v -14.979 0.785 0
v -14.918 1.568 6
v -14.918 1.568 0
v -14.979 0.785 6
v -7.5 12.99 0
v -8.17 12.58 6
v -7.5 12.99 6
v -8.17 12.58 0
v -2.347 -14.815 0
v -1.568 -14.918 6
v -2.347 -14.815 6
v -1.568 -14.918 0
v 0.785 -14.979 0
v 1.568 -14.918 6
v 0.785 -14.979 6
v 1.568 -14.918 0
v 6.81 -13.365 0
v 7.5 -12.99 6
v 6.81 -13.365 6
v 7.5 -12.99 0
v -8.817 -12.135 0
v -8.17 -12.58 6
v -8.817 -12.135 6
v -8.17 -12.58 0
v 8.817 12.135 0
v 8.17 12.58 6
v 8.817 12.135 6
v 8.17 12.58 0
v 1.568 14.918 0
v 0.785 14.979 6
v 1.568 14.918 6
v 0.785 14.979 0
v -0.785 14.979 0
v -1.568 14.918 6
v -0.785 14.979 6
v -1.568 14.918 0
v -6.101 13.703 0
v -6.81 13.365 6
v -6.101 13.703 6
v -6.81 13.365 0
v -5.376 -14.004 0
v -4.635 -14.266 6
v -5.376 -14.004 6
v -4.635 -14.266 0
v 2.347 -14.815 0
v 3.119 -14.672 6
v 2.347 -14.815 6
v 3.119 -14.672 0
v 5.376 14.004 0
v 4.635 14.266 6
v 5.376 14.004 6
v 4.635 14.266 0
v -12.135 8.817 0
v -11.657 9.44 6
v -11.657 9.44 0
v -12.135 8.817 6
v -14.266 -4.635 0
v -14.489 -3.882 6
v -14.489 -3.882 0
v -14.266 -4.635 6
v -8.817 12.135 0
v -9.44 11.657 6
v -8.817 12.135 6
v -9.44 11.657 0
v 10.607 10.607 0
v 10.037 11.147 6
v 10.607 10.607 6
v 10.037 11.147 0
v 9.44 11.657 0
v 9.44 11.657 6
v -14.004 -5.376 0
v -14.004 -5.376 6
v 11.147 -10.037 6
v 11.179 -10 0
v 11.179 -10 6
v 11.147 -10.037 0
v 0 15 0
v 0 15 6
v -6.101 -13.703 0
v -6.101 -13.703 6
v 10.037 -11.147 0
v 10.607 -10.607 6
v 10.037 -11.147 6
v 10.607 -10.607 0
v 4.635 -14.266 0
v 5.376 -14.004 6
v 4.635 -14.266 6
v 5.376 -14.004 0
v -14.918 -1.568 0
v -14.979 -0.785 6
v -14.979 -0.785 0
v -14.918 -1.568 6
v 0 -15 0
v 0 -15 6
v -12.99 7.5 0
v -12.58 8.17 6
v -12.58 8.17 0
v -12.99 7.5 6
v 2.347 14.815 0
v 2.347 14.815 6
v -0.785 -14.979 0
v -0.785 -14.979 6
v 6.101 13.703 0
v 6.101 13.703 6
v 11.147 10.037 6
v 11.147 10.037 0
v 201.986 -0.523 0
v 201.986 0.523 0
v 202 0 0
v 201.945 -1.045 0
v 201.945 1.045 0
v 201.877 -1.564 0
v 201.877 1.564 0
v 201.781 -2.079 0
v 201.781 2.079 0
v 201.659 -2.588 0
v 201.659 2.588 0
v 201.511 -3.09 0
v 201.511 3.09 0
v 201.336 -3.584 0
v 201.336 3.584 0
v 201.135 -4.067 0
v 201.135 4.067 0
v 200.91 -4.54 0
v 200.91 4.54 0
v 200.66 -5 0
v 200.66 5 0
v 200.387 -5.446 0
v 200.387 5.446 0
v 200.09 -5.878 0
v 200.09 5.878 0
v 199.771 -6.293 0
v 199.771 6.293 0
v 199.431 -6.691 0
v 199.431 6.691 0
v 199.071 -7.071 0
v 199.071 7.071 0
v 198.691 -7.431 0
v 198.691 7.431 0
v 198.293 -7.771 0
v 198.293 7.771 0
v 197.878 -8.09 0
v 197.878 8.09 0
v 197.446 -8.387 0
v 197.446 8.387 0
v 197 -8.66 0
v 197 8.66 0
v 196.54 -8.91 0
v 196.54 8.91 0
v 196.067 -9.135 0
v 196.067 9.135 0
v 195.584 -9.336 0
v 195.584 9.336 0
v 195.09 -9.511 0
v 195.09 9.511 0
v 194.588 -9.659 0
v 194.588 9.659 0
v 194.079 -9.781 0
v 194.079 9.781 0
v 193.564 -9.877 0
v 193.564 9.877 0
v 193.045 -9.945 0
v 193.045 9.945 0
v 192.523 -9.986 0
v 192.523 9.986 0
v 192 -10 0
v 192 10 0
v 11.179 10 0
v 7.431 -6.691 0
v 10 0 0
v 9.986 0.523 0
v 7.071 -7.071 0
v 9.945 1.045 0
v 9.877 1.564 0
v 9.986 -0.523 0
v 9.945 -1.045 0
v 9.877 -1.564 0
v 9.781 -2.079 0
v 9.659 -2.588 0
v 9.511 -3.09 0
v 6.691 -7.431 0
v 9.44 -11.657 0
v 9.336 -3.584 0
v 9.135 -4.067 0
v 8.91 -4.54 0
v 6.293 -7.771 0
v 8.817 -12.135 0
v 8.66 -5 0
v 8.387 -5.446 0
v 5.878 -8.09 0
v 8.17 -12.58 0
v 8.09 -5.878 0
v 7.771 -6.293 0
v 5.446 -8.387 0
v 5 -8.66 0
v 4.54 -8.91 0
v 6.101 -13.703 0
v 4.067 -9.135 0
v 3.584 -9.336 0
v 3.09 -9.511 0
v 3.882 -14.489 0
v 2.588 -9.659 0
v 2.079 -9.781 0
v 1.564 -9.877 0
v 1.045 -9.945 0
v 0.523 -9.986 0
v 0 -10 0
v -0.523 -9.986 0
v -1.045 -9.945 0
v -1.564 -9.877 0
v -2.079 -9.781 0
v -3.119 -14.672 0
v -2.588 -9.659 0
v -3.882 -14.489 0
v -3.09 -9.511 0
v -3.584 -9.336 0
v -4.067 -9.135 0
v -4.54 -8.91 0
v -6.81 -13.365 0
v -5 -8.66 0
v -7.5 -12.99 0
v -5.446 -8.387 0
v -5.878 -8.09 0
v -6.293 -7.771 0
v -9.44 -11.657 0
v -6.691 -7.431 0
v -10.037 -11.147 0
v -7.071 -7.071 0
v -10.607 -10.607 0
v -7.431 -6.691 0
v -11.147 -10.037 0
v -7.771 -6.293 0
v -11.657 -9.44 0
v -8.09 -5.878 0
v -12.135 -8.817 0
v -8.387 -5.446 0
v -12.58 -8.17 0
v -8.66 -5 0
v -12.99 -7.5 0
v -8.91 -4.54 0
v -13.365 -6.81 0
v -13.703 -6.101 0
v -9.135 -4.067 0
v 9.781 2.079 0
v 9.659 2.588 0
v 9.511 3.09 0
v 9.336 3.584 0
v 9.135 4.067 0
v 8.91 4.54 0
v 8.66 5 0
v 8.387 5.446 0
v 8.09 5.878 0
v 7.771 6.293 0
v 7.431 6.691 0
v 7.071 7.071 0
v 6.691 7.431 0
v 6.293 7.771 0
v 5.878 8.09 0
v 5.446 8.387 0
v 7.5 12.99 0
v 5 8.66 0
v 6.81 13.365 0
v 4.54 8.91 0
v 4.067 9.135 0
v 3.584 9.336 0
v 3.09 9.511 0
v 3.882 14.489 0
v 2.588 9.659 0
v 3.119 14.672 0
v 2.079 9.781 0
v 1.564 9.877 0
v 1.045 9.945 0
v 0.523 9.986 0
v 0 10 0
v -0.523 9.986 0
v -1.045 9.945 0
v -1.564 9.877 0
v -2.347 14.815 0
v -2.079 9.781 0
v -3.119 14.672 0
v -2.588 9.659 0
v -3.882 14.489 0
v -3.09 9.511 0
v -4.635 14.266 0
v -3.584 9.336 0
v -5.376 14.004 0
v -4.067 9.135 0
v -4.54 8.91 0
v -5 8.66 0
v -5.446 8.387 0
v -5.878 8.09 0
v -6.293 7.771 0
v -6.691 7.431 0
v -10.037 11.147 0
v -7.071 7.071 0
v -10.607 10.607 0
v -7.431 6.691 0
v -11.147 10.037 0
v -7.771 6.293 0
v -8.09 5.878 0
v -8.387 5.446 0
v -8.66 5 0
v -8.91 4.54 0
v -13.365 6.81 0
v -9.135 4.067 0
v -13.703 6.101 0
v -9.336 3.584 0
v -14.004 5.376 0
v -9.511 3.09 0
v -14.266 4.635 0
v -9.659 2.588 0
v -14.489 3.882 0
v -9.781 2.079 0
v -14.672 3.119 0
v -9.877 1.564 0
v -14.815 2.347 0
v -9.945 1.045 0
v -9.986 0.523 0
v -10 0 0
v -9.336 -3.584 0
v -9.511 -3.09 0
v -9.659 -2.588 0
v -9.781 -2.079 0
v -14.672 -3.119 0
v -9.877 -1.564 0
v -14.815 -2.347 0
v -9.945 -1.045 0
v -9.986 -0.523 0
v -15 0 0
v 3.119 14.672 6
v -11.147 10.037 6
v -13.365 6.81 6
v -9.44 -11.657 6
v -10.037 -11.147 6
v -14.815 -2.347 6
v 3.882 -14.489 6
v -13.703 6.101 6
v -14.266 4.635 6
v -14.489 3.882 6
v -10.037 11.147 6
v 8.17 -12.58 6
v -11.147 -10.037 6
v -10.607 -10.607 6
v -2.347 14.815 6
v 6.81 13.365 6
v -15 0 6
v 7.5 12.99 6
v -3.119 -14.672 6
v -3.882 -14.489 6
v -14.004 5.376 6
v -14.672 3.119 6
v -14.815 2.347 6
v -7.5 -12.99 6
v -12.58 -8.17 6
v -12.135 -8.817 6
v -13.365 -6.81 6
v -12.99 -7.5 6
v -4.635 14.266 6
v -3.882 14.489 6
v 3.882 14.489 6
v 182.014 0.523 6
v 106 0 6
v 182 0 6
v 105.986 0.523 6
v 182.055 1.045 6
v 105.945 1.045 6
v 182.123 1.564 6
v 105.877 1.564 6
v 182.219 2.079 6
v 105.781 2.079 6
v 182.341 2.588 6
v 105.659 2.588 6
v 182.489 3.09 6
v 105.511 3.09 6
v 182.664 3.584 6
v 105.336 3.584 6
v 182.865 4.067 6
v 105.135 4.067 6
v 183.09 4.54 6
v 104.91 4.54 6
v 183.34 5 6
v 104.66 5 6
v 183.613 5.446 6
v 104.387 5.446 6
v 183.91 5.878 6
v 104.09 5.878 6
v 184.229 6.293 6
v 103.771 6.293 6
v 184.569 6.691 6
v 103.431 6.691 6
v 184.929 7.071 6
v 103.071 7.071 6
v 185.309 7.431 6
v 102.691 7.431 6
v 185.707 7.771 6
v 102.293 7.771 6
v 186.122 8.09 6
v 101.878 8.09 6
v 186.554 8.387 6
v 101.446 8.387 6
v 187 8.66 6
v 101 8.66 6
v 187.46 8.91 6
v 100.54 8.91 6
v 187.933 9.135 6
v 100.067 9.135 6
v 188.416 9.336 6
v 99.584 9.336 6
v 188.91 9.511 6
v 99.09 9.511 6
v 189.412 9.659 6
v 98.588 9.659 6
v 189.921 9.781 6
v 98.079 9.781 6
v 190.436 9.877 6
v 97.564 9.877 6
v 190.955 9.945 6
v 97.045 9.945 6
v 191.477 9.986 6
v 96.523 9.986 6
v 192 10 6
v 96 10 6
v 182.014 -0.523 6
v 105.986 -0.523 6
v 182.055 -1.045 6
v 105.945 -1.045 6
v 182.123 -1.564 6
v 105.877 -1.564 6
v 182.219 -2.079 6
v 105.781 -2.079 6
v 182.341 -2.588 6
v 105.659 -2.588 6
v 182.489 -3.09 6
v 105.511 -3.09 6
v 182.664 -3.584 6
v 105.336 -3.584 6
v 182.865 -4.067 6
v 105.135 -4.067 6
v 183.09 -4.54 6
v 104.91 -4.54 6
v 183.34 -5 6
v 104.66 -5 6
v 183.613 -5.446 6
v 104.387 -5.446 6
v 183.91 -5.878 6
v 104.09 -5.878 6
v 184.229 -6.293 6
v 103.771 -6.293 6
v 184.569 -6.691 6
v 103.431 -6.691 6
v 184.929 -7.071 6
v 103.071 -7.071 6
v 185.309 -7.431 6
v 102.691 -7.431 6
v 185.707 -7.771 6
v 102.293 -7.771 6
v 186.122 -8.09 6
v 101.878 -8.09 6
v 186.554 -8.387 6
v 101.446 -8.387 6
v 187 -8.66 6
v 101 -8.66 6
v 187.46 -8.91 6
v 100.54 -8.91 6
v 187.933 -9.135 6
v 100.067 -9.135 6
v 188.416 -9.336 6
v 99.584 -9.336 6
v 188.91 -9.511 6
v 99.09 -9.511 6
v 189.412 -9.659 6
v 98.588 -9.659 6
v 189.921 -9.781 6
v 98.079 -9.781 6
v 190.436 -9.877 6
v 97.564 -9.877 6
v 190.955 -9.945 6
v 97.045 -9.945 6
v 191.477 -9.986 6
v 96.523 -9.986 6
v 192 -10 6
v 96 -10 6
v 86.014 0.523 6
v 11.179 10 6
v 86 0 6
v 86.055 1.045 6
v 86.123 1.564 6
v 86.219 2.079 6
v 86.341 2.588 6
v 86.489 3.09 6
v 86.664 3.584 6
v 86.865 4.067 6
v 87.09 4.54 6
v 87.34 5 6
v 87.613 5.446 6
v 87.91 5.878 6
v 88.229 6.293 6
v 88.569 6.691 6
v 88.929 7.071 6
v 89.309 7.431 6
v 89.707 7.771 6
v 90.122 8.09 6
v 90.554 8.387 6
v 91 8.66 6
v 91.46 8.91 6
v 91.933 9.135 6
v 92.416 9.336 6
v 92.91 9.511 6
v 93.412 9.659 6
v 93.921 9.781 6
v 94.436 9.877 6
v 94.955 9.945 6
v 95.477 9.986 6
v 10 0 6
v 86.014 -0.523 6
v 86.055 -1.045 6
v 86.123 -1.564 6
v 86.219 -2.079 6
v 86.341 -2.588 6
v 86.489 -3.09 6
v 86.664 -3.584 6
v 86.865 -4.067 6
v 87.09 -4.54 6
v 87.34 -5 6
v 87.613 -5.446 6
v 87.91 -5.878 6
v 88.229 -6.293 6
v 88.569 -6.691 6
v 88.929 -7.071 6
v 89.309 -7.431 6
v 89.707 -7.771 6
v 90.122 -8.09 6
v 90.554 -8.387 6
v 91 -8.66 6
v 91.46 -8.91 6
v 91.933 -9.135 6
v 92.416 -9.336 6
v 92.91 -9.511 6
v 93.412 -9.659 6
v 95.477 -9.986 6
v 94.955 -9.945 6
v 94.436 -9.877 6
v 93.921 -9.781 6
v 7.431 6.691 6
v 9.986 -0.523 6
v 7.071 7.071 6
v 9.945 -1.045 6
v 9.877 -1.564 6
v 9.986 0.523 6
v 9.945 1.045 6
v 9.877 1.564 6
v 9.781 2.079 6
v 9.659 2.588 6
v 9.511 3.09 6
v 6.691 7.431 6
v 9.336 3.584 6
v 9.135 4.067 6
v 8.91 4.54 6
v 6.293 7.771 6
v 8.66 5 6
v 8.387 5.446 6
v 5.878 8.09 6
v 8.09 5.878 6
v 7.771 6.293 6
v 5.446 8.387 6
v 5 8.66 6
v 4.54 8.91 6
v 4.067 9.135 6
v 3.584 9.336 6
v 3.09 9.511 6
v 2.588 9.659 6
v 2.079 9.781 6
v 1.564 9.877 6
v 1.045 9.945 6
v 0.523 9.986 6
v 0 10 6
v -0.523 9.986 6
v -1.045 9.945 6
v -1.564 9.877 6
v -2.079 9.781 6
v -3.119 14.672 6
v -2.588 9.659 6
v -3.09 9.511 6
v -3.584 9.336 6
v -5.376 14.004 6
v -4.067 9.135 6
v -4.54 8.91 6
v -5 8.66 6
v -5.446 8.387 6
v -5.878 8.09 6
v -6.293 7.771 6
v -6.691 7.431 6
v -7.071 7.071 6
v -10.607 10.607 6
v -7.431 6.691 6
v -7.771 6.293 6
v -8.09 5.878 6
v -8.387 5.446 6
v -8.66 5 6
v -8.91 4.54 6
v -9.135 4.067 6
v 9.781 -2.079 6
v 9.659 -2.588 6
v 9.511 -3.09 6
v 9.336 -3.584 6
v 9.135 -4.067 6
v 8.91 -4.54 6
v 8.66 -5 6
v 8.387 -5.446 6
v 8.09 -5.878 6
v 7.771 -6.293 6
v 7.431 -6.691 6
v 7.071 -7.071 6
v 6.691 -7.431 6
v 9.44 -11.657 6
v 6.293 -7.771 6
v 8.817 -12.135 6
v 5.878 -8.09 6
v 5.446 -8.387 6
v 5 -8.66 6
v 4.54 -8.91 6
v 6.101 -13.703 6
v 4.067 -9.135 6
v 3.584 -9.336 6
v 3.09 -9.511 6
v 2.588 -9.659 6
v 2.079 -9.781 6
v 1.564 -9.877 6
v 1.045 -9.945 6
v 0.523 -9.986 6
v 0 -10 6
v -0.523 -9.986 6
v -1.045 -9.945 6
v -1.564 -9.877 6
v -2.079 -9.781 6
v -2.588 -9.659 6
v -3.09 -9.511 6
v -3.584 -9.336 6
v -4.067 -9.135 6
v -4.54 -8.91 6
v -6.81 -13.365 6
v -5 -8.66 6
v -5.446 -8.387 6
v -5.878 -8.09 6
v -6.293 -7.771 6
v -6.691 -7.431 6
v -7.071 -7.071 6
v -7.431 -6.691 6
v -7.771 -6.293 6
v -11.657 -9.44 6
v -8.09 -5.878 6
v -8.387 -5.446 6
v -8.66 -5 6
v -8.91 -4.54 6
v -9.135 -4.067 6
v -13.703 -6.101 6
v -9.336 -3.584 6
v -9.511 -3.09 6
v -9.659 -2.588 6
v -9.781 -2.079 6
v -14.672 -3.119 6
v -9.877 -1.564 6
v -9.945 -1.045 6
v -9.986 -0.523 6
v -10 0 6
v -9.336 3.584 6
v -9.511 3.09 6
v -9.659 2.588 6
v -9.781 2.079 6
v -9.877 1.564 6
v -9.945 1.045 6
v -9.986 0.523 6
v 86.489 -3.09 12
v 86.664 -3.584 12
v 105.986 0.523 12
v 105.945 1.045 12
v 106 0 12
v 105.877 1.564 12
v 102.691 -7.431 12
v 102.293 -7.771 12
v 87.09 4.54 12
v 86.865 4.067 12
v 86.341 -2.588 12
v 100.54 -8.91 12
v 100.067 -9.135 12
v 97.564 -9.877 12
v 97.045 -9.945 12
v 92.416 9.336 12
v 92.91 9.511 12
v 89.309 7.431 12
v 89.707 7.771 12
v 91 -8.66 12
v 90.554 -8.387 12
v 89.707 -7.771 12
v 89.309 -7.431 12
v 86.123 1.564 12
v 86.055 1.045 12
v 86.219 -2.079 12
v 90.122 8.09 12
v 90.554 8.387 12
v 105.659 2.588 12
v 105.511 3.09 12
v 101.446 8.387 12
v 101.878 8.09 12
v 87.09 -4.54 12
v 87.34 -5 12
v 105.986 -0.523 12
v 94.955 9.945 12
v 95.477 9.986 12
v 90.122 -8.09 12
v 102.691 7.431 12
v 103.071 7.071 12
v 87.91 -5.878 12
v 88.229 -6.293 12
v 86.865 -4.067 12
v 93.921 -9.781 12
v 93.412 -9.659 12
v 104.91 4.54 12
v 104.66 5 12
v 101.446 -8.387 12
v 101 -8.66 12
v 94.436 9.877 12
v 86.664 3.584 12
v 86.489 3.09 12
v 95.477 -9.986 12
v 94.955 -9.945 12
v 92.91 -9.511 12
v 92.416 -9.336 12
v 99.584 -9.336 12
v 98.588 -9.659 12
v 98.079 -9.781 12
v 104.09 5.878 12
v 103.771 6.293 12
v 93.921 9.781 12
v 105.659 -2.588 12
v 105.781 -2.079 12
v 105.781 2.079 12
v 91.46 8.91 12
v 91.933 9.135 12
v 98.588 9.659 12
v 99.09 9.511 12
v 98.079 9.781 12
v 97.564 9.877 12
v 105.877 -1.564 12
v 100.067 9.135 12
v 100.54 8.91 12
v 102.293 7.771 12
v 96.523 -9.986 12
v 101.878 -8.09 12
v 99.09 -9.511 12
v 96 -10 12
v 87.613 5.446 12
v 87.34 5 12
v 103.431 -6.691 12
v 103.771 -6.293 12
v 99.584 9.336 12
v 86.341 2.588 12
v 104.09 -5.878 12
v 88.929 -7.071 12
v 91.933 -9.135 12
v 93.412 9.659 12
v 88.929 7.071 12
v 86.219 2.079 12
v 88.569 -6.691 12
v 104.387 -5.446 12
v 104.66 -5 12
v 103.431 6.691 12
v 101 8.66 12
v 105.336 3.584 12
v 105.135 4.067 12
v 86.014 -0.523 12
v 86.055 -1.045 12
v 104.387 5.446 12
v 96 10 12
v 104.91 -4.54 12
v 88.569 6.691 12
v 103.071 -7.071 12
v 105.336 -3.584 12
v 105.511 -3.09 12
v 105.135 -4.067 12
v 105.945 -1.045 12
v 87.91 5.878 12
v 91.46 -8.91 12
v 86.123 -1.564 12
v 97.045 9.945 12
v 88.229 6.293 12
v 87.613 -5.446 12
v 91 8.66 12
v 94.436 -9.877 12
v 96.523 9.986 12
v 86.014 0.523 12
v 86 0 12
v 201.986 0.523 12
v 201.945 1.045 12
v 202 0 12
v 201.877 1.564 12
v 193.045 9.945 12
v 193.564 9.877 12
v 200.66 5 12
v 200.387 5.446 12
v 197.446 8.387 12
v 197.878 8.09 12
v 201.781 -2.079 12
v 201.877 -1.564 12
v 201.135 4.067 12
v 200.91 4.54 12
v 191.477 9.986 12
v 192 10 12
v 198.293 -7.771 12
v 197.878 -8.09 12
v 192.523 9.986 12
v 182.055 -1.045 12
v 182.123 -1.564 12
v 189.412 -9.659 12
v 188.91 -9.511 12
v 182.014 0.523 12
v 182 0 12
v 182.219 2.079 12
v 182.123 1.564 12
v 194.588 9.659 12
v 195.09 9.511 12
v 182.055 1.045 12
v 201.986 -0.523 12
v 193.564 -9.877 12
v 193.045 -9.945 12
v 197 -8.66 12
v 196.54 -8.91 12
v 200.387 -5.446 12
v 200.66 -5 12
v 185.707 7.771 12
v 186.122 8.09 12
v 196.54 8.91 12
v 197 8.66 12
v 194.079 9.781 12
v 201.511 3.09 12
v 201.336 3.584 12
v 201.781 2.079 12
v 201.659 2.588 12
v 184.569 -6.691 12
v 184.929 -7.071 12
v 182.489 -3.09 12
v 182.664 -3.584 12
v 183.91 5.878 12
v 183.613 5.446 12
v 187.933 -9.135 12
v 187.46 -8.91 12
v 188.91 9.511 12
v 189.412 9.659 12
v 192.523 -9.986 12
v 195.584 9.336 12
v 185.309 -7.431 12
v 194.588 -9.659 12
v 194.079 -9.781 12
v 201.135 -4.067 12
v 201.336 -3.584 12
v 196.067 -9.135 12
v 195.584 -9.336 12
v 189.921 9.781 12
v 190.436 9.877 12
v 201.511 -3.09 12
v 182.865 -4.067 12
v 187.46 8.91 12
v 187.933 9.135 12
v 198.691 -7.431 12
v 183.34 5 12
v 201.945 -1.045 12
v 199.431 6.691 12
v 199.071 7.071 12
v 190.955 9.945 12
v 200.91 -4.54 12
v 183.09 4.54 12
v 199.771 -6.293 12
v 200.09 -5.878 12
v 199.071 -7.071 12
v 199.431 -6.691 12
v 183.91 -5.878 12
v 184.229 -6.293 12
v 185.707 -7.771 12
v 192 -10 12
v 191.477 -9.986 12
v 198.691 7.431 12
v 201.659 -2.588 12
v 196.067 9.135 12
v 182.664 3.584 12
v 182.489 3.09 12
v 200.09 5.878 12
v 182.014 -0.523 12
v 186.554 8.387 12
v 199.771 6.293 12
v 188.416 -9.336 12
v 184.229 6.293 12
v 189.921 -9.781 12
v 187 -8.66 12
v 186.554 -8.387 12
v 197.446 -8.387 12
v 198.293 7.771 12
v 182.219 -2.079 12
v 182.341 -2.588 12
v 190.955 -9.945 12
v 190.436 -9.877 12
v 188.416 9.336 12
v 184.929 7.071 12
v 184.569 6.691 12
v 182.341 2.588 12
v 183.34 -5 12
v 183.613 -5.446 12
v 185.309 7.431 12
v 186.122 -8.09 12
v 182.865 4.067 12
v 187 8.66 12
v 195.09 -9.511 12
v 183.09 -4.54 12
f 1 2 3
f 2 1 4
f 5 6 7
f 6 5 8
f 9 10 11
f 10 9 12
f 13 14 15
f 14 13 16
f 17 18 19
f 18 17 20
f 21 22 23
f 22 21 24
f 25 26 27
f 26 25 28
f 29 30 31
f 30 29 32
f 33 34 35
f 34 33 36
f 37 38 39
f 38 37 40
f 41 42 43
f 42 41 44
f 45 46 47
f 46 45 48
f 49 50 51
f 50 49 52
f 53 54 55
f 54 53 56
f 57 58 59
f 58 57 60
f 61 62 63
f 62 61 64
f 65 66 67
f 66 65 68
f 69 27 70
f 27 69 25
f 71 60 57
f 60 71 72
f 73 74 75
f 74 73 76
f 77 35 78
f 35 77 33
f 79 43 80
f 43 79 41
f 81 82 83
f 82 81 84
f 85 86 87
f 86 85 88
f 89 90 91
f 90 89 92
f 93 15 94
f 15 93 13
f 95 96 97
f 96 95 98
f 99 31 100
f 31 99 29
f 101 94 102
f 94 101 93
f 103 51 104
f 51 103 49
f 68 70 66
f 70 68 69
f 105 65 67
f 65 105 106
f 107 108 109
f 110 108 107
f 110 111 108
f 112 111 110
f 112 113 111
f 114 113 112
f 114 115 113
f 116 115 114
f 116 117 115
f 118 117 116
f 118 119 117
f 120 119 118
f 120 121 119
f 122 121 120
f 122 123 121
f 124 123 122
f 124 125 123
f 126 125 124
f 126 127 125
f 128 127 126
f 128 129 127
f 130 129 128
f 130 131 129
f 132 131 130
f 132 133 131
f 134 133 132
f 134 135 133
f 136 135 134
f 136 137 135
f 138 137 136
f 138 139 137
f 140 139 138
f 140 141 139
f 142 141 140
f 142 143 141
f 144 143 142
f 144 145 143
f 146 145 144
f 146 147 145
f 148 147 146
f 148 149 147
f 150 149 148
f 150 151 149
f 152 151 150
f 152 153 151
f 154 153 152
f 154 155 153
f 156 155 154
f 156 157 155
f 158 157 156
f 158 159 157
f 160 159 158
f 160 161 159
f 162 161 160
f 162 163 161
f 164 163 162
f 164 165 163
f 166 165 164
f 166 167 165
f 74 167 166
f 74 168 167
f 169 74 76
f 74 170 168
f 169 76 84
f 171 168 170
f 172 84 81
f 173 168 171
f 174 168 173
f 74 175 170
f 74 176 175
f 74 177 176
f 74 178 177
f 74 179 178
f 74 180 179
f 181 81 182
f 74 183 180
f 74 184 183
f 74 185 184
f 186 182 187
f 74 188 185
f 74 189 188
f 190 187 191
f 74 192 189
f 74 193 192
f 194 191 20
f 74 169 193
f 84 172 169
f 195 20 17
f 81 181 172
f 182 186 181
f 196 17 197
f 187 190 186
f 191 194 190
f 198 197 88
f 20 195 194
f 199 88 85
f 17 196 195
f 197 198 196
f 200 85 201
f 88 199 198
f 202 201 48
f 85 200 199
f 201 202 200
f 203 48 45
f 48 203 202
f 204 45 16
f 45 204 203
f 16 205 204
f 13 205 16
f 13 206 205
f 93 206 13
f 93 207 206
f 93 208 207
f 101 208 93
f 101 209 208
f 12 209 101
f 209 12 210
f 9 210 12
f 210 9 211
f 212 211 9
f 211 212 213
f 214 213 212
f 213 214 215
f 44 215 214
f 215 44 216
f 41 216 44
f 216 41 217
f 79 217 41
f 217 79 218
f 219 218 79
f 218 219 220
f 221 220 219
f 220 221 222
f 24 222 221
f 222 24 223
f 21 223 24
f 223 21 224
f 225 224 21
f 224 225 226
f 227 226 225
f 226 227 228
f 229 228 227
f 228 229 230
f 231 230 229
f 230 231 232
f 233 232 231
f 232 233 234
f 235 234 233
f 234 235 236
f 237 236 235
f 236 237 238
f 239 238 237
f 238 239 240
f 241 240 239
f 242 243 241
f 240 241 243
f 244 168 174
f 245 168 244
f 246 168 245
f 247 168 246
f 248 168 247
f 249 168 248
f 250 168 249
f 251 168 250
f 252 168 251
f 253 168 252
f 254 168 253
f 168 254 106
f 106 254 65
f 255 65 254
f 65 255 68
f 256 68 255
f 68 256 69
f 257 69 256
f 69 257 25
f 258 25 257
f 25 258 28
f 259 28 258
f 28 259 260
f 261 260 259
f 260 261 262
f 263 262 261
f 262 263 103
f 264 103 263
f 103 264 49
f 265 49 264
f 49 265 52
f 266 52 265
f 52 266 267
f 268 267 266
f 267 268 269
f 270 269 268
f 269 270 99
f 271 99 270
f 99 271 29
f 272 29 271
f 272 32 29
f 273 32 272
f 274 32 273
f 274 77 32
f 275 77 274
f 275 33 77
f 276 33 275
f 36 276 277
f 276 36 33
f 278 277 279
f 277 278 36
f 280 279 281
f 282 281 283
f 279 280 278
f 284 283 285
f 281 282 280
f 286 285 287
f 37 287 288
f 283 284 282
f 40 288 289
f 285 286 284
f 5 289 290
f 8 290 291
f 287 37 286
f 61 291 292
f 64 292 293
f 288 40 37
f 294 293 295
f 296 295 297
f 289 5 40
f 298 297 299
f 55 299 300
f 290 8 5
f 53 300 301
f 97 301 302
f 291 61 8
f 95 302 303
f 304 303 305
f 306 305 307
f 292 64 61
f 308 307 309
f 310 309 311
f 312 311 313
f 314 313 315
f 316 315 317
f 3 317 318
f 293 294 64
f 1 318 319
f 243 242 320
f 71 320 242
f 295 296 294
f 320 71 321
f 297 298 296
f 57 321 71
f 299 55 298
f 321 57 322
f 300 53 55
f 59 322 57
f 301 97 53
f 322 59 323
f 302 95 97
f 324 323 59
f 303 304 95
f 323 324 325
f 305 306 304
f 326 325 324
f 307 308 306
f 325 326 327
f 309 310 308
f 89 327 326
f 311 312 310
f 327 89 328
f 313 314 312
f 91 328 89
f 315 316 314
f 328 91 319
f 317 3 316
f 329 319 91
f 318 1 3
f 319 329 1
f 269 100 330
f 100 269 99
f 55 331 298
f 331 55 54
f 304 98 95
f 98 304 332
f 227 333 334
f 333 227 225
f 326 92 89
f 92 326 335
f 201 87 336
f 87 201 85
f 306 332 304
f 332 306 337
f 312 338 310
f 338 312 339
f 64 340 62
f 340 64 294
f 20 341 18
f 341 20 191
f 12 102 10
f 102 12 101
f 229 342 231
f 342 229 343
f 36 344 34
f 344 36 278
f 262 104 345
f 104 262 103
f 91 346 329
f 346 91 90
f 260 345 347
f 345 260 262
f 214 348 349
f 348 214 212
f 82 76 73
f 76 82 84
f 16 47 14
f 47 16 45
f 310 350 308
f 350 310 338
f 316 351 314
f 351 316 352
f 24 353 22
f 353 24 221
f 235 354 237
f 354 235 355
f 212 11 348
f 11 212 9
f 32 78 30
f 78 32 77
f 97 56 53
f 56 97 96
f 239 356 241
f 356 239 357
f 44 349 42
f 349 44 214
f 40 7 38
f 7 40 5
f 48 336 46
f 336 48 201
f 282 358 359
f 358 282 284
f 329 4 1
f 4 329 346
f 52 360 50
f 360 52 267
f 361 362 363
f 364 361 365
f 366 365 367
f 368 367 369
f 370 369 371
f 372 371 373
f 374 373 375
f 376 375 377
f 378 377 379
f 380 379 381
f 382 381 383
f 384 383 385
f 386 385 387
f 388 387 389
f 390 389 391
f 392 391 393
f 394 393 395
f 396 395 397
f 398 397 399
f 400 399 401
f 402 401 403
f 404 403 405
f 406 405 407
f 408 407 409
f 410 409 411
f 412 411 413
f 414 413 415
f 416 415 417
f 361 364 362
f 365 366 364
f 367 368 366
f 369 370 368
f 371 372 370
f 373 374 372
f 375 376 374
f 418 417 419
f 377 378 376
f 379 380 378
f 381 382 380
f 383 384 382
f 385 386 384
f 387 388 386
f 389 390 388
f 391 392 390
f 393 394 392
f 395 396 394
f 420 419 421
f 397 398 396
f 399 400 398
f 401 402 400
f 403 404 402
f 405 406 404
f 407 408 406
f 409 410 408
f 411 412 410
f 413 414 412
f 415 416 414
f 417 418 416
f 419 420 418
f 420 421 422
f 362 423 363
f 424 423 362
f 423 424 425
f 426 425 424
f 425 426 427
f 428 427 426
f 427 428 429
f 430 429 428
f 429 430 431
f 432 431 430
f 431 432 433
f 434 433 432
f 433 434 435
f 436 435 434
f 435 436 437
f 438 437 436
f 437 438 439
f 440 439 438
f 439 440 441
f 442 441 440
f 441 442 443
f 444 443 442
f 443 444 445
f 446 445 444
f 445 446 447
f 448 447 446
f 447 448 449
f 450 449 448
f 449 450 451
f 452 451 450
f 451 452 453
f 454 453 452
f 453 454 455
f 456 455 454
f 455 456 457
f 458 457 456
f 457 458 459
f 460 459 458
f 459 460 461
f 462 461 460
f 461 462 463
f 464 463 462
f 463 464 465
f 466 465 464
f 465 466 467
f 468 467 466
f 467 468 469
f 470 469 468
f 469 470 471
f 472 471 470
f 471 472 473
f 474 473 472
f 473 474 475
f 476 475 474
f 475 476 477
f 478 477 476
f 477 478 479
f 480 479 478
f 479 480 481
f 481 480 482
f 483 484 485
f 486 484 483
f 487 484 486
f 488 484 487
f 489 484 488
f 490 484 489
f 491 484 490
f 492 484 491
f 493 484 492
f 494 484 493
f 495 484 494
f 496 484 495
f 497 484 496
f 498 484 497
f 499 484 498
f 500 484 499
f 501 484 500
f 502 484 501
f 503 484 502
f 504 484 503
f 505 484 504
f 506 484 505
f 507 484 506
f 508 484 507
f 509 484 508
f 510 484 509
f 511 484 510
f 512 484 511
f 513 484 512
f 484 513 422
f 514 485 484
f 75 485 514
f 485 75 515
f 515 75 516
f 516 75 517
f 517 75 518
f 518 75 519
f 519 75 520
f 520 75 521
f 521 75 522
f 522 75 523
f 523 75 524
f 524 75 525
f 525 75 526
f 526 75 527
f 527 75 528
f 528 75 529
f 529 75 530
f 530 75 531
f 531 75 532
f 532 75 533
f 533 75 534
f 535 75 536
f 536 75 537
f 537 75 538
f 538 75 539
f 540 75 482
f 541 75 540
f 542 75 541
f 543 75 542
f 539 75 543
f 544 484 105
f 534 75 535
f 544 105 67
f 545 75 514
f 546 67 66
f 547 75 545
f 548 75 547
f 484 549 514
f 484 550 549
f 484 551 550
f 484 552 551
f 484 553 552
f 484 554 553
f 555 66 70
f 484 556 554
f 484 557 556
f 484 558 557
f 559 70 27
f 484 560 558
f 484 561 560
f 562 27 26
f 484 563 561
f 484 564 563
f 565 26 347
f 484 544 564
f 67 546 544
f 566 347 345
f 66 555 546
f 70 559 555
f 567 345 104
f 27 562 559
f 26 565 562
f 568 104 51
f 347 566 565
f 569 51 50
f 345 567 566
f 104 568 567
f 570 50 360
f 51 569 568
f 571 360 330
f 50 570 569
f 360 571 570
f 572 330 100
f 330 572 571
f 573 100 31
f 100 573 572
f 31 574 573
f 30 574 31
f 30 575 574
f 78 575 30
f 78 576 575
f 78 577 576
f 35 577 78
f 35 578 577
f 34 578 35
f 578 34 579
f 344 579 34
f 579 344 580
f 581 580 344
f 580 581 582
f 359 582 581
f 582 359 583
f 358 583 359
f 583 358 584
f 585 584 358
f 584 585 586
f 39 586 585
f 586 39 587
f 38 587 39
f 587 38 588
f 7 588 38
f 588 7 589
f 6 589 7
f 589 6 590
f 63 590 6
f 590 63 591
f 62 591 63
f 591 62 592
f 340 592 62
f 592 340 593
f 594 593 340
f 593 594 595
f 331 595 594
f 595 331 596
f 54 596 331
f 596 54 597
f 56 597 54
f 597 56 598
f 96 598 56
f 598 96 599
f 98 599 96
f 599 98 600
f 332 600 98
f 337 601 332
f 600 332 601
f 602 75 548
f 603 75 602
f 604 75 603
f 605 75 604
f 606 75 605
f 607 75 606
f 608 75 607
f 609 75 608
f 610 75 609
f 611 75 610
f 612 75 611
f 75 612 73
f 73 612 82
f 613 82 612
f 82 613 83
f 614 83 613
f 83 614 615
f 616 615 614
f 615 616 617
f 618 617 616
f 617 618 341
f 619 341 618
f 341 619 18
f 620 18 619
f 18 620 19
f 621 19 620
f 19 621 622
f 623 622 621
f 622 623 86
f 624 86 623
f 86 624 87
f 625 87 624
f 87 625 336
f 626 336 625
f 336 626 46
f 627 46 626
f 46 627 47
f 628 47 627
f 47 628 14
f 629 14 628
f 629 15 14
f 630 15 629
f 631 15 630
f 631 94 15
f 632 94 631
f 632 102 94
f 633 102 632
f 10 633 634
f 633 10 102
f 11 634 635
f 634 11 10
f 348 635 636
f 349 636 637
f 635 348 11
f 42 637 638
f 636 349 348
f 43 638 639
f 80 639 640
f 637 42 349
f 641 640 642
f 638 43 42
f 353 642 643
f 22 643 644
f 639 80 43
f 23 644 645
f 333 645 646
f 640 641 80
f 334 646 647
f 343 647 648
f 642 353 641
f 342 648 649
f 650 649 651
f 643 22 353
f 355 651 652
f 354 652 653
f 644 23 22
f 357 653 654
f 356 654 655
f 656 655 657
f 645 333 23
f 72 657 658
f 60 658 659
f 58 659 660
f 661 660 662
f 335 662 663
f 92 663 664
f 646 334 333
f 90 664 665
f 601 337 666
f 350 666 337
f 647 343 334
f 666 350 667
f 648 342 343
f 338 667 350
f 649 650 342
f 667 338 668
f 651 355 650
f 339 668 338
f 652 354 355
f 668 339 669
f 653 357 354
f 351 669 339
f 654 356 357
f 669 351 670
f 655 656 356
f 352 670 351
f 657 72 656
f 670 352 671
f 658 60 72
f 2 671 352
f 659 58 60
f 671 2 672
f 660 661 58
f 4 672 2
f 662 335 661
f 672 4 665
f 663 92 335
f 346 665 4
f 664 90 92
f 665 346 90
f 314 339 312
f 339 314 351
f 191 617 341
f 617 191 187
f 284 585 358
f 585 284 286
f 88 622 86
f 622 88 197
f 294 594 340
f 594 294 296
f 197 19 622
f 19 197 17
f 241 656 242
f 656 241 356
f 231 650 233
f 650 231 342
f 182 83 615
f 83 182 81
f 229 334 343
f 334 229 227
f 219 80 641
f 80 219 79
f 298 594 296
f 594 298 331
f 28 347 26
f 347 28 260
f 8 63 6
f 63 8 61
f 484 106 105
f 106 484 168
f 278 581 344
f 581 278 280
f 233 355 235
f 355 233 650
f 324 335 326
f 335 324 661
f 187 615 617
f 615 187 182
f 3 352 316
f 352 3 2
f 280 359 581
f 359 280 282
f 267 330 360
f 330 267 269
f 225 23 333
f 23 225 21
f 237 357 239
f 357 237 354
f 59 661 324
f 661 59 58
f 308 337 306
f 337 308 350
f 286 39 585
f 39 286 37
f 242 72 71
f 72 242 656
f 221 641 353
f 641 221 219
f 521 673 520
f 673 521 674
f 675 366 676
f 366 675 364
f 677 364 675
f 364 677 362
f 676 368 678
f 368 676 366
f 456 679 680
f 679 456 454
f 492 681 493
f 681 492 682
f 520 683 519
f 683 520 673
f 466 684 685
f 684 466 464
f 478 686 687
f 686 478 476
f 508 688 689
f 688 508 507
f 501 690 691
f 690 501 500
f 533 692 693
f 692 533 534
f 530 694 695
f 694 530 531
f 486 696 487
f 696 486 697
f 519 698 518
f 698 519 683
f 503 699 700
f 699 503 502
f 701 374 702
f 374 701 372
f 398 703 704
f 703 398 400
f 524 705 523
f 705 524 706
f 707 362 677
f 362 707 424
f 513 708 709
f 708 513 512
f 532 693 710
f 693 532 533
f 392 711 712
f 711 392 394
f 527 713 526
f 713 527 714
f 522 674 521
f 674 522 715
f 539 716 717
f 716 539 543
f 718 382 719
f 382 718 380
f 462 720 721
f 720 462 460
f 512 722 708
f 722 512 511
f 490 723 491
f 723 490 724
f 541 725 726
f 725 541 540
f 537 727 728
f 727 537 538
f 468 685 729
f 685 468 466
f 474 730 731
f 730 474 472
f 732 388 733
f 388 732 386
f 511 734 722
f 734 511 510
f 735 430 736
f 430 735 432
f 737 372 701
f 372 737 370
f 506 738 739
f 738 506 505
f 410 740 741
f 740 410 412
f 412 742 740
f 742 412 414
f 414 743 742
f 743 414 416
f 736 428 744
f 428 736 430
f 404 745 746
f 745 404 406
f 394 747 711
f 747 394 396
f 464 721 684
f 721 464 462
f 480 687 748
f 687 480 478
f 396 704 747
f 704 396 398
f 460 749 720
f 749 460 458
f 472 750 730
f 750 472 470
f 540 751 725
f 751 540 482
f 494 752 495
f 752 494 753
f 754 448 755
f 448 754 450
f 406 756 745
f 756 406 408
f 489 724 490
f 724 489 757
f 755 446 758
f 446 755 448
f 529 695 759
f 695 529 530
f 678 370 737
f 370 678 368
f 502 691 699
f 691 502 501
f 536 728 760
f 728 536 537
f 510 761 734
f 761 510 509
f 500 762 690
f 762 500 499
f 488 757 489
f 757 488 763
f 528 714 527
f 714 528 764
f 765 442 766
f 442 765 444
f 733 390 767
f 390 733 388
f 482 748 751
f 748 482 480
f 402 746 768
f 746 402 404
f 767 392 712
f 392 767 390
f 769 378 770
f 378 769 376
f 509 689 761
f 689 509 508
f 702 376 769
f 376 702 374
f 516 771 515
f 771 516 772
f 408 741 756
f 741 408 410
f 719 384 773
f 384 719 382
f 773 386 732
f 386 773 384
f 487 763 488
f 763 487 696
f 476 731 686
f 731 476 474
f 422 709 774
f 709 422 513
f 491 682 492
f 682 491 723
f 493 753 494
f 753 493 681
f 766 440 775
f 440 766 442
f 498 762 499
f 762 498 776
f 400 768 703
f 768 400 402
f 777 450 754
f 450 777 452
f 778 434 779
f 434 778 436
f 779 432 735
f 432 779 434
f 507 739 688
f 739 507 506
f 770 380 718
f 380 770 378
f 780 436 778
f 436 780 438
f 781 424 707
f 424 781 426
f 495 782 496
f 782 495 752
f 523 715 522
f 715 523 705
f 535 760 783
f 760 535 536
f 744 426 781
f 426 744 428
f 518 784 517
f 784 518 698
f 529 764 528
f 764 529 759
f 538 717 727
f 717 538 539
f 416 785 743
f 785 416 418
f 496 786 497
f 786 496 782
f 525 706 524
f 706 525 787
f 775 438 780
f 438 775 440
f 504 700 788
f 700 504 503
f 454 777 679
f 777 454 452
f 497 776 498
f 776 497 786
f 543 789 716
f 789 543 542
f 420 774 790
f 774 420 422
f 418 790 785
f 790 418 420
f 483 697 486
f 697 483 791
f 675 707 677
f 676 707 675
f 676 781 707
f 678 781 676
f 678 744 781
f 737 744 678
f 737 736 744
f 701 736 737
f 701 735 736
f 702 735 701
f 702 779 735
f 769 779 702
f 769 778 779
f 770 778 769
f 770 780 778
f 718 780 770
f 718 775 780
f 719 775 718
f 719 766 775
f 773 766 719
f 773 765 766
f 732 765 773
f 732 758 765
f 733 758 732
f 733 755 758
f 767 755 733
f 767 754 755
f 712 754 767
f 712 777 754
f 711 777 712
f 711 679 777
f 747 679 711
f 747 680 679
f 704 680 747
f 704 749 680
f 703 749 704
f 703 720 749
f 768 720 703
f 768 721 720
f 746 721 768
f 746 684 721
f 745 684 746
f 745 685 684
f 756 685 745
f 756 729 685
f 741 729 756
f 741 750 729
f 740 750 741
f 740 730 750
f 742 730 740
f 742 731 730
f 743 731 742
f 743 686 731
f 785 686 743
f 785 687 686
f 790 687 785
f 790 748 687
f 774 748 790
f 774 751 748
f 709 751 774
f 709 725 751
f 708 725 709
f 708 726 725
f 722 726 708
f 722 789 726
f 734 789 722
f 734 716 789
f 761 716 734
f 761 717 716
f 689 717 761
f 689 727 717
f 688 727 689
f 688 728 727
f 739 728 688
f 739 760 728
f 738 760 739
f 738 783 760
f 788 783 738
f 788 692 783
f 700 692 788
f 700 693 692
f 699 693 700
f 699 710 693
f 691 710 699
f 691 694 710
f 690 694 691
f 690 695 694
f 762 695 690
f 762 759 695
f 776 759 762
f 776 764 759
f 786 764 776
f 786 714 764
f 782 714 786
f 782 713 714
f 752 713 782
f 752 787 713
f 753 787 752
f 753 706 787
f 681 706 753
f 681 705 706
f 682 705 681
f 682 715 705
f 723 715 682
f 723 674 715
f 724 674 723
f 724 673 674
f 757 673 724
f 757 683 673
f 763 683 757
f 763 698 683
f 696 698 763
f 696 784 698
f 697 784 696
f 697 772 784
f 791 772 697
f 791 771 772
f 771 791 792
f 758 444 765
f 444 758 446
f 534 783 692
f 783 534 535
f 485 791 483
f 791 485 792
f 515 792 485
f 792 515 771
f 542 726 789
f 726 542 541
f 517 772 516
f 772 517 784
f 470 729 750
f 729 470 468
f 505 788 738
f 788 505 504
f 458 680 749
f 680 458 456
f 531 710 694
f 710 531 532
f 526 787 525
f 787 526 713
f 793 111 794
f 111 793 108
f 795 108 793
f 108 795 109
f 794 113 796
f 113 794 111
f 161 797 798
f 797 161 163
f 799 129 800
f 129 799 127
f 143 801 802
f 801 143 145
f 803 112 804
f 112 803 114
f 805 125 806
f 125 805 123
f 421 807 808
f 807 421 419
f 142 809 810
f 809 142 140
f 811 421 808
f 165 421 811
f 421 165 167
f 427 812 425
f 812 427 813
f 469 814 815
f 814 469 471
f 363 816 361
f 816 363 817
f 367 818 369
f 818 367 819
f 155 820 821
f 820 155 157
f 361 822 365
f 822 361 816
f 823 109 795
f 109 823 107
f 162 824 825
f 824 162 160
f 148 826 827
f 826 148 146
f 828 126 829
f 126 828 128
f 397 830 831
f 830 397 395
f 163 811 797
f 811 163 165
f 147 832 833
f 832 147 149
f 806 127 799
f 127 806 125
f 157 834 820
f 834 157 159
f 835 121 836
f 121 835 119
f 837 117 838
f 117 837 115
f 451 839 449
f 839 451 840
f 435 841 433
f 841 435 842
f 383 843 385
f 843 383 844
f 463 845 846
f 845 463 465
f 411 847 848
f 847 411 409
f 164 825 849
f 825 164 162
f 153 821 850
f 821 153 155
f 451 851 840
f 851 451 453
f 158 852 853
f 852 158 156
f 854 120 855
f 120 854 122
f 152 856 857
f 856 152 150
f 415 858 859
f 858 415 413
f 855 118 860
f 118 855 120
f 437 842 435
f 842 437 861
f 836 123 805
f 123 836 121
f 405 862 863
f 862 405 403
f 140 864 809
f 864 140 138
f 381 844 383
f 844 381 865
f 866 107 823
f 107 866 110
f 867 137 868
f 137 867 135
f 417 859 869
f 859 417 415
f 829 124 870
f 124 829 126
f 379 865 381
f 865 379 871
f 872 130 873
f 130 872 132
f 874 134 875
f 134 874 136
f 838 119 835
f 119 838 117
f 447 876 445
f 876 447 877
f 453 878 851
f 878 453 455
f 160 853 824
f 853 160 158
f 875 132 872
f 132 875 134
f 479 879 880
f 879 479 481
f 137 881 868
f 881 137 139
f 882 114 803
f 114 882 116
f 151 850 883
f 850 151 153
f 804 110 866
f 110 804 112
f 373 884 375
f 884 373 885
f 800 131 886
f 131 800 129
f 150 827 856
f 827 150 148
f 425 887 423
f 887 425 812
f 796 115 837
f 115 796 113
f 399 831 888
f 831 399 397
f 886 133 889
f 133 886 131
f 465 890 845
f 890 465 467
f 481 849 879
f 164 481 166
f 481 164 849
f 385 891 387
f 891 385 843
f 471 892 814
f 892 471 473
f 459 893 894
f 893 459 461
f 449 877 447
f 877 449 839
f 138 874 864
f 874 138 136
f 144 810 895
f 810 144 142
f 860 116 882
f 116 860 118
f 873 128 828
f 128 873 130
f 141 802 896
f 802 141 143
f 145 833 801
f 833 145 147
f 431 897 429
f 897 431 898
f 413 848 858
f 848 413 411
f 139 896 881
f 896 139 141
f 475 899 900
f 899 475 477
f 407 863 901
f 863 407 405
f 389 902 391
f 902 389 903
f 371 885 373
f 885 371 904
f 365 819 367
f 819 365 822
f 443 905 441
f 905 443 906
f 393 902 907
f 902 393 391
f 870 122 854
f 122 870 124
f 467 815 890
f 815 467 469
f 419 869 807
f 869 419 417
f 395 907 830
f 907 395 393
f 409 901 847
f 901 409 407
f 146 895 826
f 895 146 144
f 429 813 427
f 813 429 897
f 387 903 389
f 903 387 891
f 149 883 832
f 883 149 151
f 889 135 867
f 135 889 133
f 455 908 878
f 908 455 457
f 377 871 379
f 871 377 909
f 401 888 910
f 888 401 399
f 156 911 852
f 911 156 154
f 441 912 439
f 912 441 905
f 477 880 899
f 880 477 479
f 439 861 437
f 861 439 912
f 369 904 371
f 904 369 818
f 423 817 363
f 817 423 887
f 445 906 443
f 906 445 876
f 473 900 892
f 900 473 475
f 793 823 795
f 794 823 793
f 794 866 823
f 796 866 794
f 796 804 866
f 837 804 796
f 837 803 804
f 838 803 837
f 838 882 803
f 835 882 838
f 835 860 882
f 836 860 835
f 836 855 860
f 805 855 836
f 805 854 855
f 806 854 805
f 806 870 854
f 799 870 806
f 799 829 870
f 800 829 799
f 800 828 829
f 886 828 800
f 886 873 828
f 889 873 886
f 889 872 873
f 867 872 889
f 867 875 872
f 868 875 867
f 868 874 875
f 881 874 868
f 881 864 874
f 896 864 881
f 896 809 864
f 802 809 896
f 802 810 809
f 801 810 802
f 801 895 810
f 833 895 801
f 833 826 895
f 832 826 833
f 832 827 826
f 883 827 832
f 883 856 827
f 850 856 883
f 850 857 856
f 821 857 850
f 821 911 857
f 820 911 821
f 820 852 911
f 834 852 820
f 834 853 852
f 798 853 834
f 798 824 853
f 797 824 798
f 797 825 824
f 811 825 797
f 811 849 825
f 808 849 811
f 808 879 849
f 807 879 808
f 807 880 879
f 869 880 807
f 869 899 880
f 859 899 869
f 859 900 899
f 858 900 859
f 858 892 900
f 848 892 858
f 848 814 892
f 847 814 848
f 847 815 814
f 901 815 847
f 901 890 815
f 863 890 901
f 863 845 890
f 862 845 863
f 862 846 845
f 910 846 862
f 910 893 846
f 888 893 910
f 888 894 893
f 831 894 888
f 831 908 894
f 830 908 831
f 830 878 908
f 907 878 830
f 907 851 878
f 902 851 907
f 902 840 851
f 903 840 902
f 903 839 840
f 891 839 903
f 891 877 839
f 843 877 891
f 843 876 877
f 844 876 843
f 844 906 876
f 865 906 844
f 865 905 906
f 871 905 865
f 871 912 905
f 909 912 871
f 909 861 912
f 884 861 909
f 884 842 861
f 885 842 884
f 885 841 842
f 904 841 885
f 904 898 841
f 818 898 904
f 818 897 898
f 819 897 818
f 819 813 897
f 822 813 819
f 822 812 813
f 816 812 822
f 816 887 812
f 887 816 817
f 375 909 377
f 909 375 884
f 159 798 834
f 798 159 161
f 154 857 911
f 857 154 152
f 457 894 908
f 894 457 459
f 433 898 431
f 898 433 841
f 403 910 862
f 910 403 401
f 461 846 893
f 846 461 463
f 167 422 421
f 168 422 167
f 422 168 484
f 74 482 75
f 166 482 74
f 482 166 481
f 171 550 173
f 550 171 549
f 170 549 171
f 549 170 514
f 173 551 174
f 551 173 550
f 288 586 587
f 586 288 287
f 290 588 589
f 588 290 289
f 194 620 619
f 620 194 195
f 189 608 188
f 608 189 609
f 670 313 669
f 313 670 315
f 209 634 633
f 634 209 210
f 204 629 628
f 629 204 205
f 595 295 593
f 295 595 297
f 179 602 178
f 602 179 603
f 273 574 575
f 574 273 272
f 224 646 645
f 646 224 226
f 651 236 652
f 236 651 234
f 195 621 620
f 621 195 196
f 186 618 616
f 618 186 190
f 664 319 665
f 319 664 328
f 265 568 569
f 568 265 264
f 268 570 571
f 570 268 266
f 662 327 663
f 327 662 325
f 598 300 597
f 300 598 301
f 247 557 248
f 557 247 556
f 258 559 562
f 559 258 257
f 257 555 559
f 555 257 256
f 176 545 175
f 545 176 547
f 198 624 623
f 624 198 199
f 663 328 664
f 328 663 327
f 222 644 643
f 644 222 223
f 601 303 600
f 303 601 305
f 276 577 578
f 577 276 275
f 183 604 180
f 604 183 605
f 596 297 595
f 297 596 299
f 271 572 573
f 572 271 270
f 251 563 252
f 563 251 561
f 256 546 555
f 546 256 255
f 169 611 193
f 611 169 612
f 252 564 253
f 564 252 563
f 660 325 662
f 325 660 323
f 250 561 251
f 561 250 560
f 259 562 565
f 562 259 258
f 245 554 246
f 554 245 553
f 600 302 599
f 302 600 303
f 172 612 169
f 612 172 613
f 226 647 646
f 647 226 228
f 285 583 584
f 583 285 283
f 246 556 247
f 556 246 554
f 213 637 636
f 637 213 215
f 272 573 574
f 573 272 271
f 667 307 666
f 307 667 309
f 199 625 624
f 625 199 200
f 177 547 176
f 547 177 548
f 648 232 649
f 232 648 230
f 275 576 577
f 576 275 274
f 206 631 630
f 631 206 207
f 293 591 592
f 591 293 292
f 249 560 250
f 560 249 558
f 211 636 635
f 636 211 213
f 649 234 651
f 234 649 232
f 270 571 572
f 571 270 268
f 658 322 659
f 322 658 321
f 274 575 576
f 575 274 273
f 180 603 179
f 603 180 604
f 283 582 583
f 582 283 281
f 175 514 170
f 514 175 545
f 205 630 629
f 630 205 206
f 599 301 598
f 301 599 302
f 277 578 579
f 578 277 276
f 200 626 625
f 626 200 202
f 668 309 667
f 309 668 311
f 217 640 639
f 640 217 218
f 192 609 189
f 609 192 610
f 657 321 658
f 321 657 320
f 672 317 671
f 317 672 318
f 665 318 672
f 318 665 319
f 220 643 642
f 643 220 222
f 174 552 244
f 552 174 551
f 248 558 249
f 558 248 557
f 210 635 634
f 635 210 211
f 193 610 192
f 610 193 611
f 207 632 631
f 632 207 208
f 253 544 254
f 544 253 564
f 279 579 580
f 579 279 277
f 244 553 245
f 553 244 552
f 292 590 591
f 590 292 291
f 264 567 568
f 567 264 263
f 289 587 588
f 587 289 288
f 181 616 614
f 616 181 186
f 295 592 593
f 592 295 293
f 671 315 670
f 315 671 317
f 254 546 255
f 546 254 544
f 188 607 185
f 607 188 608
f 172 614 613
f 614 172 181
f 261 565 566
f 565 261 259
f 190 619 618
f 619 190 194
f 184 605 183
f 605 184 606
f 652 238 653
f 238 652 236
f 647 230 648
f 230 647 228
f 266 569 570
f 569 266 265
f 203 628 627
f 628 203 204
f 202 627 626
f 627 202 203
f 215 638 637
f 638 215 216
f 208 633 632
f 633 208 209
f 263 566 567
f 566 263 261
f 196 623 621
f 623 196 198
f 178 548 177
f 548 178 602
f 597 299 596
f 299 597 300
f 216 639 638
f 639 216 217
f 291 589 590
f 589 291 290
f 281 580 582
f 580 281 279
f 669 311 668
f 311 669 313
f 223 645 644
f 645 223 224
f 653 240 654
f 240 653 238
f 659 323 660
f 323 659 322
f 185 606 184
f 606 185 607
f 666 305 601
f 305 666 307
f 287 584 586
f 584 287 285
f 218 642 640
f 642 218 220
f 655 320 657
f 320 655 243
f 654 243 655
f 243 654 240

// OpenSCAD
$fn=120;
barHeight = 6;
pin=14;

function polar_to_xy(v) = [v[1] * cos(v[0]), v[1] * sin(v[0] )];

module polar_profile(control_points,step) {
/*
    control_points is an array of arrays, each of which defines a 
    point in polar cordinates [angle, radius] 
    the last angle must be the first angle + 360 for a complete profile
      e.g. [ [0,5], [130,9.9], [140,10], [350,10], [360,5] ]
    the result is a 2D profile interpolated at step degree intervals
    between these points
    by kit.wallace@gmail.com
*/
    for (angle =[0: step: 360 - 1])
    {
       ps = [angle,  lookup(angle, control_points)];
       pe = [angle+step,  lookup(angle+step, control_points) ];
       polygon ([ [0,0], polar_to_xy(ps), polar_to_xy(pe)]);
    }
}

module Cam(bar = 6)
{
  difference()
  {
    union()
    {
//    snail = [ [0,20], [90,20], [260,30], [270,30],[360,29] ];
     snail = [ [0,29], [90,30], [100,30], [270,20],[360,20] ];
      translate([0,0,0])
        cylinder(r=10, h=bar+pin);
      linear_extrude(height = bar)
        polar_profile(snail,1);
      translate([0,-10,0])
        cube([96,20,bar*.8]);
      translate([96,0,0])
        cylinder(r=10, h=bar*.8);
    }
    translate([0,0,-1])
      cylinder(r=3.5, h=bar+pin+2);
    translate([0,0,-1])
      cylinder(r=6, h=7);
  }
}

module L(bar = 6) 
{
difference()
{
  union()
  {
    translate([0,0,0])
      cylinder(r=10, h=bar+pin);
    translate([96,0,0])
      cylinder(r=10, h=bar+pin);
    translate([0,96,0])
      cylinder(r=10, h=bar+pin);
    translate([-10,0,0])
      cube([20,96,bar]);
    translate([0,-10,0])
      cube([96,20,bar]);
  }
  translate([11,11,-0.5])
    cylinder(r=1.5875,h=bar+pin+1);
}
}

module Long(bar = 6) 
{
  union()
  {
    translate([0,0,0])
      cylinder(r=10, h=bar+pin);
    translate([96,0,0])
      cylinder(r=10, h=bar+pin);
    translate([96+96,0,0])
      cylinder(r=10, h=bar+pin);
    translate([0,-10,0])
      cube([96+96,20,bar]);
  }
}

module Short(bar = 6) 
{
  union()
  {
    translate([0,0,0])
      cylinder(r=10, h=bar+pin);
    translate([96,0,0])
      cylinder(r=10, h=bar+pin);
    translate([0,-10,0])
      cube([96,20,bar]);
  }
}

module Dog(bar = 6) 
{
  difference()
  {
    union()
    {
      translate([0,0,0])
        cylinder(r=10, h=bar+pin);
      translate([0,0,0])
        cylinder(r=12.52, h=bar);
    }
    translate([10,-10,-1])
      cube([20,20,bar+2]);
  }
}

module Long2(bar = 6) 
{
  union()
  {
    translate([0,0,0])
      cylinder(r=10, h=bar+pin);
    translate([96,0,0])
      cylinder(r=10, h=bar+pin);
    translate([-48,-10,0])
      cube([96+96,20,bar]);
    translate([-48,0,0])
      cylinder(r=10,h=bar);    
    translate([96+48,0,0])
      cylinder(r=10,h=bar);    
  }
}

module template(bar = 6, pin=6) 
{
  difference()
  {
    union()
    {
      translate([0,0,0])
        cylinder(r=15, h=bar);
      translate([96,0,0])
        cylinder(r=10, h=bar+pin);
      translate([96+96,0,0])
        cylinder(r=10, h=bar+pin);
      translate([0,-10,0])
        cube([96+96,20,bar]);
    }
    translate([0,0,-1])
      cylinder(r=10, h=bar+2);
  }
}

//L(barHeight);
//translate([0,30,0])
  //Long(barHeight);
//translate([0,60,0])
  //Short(barHeight);
//translate([48,0,0])
  //Long2(barHeight);
//Dog(barHeight);
//Cam(barHeight);
template();
